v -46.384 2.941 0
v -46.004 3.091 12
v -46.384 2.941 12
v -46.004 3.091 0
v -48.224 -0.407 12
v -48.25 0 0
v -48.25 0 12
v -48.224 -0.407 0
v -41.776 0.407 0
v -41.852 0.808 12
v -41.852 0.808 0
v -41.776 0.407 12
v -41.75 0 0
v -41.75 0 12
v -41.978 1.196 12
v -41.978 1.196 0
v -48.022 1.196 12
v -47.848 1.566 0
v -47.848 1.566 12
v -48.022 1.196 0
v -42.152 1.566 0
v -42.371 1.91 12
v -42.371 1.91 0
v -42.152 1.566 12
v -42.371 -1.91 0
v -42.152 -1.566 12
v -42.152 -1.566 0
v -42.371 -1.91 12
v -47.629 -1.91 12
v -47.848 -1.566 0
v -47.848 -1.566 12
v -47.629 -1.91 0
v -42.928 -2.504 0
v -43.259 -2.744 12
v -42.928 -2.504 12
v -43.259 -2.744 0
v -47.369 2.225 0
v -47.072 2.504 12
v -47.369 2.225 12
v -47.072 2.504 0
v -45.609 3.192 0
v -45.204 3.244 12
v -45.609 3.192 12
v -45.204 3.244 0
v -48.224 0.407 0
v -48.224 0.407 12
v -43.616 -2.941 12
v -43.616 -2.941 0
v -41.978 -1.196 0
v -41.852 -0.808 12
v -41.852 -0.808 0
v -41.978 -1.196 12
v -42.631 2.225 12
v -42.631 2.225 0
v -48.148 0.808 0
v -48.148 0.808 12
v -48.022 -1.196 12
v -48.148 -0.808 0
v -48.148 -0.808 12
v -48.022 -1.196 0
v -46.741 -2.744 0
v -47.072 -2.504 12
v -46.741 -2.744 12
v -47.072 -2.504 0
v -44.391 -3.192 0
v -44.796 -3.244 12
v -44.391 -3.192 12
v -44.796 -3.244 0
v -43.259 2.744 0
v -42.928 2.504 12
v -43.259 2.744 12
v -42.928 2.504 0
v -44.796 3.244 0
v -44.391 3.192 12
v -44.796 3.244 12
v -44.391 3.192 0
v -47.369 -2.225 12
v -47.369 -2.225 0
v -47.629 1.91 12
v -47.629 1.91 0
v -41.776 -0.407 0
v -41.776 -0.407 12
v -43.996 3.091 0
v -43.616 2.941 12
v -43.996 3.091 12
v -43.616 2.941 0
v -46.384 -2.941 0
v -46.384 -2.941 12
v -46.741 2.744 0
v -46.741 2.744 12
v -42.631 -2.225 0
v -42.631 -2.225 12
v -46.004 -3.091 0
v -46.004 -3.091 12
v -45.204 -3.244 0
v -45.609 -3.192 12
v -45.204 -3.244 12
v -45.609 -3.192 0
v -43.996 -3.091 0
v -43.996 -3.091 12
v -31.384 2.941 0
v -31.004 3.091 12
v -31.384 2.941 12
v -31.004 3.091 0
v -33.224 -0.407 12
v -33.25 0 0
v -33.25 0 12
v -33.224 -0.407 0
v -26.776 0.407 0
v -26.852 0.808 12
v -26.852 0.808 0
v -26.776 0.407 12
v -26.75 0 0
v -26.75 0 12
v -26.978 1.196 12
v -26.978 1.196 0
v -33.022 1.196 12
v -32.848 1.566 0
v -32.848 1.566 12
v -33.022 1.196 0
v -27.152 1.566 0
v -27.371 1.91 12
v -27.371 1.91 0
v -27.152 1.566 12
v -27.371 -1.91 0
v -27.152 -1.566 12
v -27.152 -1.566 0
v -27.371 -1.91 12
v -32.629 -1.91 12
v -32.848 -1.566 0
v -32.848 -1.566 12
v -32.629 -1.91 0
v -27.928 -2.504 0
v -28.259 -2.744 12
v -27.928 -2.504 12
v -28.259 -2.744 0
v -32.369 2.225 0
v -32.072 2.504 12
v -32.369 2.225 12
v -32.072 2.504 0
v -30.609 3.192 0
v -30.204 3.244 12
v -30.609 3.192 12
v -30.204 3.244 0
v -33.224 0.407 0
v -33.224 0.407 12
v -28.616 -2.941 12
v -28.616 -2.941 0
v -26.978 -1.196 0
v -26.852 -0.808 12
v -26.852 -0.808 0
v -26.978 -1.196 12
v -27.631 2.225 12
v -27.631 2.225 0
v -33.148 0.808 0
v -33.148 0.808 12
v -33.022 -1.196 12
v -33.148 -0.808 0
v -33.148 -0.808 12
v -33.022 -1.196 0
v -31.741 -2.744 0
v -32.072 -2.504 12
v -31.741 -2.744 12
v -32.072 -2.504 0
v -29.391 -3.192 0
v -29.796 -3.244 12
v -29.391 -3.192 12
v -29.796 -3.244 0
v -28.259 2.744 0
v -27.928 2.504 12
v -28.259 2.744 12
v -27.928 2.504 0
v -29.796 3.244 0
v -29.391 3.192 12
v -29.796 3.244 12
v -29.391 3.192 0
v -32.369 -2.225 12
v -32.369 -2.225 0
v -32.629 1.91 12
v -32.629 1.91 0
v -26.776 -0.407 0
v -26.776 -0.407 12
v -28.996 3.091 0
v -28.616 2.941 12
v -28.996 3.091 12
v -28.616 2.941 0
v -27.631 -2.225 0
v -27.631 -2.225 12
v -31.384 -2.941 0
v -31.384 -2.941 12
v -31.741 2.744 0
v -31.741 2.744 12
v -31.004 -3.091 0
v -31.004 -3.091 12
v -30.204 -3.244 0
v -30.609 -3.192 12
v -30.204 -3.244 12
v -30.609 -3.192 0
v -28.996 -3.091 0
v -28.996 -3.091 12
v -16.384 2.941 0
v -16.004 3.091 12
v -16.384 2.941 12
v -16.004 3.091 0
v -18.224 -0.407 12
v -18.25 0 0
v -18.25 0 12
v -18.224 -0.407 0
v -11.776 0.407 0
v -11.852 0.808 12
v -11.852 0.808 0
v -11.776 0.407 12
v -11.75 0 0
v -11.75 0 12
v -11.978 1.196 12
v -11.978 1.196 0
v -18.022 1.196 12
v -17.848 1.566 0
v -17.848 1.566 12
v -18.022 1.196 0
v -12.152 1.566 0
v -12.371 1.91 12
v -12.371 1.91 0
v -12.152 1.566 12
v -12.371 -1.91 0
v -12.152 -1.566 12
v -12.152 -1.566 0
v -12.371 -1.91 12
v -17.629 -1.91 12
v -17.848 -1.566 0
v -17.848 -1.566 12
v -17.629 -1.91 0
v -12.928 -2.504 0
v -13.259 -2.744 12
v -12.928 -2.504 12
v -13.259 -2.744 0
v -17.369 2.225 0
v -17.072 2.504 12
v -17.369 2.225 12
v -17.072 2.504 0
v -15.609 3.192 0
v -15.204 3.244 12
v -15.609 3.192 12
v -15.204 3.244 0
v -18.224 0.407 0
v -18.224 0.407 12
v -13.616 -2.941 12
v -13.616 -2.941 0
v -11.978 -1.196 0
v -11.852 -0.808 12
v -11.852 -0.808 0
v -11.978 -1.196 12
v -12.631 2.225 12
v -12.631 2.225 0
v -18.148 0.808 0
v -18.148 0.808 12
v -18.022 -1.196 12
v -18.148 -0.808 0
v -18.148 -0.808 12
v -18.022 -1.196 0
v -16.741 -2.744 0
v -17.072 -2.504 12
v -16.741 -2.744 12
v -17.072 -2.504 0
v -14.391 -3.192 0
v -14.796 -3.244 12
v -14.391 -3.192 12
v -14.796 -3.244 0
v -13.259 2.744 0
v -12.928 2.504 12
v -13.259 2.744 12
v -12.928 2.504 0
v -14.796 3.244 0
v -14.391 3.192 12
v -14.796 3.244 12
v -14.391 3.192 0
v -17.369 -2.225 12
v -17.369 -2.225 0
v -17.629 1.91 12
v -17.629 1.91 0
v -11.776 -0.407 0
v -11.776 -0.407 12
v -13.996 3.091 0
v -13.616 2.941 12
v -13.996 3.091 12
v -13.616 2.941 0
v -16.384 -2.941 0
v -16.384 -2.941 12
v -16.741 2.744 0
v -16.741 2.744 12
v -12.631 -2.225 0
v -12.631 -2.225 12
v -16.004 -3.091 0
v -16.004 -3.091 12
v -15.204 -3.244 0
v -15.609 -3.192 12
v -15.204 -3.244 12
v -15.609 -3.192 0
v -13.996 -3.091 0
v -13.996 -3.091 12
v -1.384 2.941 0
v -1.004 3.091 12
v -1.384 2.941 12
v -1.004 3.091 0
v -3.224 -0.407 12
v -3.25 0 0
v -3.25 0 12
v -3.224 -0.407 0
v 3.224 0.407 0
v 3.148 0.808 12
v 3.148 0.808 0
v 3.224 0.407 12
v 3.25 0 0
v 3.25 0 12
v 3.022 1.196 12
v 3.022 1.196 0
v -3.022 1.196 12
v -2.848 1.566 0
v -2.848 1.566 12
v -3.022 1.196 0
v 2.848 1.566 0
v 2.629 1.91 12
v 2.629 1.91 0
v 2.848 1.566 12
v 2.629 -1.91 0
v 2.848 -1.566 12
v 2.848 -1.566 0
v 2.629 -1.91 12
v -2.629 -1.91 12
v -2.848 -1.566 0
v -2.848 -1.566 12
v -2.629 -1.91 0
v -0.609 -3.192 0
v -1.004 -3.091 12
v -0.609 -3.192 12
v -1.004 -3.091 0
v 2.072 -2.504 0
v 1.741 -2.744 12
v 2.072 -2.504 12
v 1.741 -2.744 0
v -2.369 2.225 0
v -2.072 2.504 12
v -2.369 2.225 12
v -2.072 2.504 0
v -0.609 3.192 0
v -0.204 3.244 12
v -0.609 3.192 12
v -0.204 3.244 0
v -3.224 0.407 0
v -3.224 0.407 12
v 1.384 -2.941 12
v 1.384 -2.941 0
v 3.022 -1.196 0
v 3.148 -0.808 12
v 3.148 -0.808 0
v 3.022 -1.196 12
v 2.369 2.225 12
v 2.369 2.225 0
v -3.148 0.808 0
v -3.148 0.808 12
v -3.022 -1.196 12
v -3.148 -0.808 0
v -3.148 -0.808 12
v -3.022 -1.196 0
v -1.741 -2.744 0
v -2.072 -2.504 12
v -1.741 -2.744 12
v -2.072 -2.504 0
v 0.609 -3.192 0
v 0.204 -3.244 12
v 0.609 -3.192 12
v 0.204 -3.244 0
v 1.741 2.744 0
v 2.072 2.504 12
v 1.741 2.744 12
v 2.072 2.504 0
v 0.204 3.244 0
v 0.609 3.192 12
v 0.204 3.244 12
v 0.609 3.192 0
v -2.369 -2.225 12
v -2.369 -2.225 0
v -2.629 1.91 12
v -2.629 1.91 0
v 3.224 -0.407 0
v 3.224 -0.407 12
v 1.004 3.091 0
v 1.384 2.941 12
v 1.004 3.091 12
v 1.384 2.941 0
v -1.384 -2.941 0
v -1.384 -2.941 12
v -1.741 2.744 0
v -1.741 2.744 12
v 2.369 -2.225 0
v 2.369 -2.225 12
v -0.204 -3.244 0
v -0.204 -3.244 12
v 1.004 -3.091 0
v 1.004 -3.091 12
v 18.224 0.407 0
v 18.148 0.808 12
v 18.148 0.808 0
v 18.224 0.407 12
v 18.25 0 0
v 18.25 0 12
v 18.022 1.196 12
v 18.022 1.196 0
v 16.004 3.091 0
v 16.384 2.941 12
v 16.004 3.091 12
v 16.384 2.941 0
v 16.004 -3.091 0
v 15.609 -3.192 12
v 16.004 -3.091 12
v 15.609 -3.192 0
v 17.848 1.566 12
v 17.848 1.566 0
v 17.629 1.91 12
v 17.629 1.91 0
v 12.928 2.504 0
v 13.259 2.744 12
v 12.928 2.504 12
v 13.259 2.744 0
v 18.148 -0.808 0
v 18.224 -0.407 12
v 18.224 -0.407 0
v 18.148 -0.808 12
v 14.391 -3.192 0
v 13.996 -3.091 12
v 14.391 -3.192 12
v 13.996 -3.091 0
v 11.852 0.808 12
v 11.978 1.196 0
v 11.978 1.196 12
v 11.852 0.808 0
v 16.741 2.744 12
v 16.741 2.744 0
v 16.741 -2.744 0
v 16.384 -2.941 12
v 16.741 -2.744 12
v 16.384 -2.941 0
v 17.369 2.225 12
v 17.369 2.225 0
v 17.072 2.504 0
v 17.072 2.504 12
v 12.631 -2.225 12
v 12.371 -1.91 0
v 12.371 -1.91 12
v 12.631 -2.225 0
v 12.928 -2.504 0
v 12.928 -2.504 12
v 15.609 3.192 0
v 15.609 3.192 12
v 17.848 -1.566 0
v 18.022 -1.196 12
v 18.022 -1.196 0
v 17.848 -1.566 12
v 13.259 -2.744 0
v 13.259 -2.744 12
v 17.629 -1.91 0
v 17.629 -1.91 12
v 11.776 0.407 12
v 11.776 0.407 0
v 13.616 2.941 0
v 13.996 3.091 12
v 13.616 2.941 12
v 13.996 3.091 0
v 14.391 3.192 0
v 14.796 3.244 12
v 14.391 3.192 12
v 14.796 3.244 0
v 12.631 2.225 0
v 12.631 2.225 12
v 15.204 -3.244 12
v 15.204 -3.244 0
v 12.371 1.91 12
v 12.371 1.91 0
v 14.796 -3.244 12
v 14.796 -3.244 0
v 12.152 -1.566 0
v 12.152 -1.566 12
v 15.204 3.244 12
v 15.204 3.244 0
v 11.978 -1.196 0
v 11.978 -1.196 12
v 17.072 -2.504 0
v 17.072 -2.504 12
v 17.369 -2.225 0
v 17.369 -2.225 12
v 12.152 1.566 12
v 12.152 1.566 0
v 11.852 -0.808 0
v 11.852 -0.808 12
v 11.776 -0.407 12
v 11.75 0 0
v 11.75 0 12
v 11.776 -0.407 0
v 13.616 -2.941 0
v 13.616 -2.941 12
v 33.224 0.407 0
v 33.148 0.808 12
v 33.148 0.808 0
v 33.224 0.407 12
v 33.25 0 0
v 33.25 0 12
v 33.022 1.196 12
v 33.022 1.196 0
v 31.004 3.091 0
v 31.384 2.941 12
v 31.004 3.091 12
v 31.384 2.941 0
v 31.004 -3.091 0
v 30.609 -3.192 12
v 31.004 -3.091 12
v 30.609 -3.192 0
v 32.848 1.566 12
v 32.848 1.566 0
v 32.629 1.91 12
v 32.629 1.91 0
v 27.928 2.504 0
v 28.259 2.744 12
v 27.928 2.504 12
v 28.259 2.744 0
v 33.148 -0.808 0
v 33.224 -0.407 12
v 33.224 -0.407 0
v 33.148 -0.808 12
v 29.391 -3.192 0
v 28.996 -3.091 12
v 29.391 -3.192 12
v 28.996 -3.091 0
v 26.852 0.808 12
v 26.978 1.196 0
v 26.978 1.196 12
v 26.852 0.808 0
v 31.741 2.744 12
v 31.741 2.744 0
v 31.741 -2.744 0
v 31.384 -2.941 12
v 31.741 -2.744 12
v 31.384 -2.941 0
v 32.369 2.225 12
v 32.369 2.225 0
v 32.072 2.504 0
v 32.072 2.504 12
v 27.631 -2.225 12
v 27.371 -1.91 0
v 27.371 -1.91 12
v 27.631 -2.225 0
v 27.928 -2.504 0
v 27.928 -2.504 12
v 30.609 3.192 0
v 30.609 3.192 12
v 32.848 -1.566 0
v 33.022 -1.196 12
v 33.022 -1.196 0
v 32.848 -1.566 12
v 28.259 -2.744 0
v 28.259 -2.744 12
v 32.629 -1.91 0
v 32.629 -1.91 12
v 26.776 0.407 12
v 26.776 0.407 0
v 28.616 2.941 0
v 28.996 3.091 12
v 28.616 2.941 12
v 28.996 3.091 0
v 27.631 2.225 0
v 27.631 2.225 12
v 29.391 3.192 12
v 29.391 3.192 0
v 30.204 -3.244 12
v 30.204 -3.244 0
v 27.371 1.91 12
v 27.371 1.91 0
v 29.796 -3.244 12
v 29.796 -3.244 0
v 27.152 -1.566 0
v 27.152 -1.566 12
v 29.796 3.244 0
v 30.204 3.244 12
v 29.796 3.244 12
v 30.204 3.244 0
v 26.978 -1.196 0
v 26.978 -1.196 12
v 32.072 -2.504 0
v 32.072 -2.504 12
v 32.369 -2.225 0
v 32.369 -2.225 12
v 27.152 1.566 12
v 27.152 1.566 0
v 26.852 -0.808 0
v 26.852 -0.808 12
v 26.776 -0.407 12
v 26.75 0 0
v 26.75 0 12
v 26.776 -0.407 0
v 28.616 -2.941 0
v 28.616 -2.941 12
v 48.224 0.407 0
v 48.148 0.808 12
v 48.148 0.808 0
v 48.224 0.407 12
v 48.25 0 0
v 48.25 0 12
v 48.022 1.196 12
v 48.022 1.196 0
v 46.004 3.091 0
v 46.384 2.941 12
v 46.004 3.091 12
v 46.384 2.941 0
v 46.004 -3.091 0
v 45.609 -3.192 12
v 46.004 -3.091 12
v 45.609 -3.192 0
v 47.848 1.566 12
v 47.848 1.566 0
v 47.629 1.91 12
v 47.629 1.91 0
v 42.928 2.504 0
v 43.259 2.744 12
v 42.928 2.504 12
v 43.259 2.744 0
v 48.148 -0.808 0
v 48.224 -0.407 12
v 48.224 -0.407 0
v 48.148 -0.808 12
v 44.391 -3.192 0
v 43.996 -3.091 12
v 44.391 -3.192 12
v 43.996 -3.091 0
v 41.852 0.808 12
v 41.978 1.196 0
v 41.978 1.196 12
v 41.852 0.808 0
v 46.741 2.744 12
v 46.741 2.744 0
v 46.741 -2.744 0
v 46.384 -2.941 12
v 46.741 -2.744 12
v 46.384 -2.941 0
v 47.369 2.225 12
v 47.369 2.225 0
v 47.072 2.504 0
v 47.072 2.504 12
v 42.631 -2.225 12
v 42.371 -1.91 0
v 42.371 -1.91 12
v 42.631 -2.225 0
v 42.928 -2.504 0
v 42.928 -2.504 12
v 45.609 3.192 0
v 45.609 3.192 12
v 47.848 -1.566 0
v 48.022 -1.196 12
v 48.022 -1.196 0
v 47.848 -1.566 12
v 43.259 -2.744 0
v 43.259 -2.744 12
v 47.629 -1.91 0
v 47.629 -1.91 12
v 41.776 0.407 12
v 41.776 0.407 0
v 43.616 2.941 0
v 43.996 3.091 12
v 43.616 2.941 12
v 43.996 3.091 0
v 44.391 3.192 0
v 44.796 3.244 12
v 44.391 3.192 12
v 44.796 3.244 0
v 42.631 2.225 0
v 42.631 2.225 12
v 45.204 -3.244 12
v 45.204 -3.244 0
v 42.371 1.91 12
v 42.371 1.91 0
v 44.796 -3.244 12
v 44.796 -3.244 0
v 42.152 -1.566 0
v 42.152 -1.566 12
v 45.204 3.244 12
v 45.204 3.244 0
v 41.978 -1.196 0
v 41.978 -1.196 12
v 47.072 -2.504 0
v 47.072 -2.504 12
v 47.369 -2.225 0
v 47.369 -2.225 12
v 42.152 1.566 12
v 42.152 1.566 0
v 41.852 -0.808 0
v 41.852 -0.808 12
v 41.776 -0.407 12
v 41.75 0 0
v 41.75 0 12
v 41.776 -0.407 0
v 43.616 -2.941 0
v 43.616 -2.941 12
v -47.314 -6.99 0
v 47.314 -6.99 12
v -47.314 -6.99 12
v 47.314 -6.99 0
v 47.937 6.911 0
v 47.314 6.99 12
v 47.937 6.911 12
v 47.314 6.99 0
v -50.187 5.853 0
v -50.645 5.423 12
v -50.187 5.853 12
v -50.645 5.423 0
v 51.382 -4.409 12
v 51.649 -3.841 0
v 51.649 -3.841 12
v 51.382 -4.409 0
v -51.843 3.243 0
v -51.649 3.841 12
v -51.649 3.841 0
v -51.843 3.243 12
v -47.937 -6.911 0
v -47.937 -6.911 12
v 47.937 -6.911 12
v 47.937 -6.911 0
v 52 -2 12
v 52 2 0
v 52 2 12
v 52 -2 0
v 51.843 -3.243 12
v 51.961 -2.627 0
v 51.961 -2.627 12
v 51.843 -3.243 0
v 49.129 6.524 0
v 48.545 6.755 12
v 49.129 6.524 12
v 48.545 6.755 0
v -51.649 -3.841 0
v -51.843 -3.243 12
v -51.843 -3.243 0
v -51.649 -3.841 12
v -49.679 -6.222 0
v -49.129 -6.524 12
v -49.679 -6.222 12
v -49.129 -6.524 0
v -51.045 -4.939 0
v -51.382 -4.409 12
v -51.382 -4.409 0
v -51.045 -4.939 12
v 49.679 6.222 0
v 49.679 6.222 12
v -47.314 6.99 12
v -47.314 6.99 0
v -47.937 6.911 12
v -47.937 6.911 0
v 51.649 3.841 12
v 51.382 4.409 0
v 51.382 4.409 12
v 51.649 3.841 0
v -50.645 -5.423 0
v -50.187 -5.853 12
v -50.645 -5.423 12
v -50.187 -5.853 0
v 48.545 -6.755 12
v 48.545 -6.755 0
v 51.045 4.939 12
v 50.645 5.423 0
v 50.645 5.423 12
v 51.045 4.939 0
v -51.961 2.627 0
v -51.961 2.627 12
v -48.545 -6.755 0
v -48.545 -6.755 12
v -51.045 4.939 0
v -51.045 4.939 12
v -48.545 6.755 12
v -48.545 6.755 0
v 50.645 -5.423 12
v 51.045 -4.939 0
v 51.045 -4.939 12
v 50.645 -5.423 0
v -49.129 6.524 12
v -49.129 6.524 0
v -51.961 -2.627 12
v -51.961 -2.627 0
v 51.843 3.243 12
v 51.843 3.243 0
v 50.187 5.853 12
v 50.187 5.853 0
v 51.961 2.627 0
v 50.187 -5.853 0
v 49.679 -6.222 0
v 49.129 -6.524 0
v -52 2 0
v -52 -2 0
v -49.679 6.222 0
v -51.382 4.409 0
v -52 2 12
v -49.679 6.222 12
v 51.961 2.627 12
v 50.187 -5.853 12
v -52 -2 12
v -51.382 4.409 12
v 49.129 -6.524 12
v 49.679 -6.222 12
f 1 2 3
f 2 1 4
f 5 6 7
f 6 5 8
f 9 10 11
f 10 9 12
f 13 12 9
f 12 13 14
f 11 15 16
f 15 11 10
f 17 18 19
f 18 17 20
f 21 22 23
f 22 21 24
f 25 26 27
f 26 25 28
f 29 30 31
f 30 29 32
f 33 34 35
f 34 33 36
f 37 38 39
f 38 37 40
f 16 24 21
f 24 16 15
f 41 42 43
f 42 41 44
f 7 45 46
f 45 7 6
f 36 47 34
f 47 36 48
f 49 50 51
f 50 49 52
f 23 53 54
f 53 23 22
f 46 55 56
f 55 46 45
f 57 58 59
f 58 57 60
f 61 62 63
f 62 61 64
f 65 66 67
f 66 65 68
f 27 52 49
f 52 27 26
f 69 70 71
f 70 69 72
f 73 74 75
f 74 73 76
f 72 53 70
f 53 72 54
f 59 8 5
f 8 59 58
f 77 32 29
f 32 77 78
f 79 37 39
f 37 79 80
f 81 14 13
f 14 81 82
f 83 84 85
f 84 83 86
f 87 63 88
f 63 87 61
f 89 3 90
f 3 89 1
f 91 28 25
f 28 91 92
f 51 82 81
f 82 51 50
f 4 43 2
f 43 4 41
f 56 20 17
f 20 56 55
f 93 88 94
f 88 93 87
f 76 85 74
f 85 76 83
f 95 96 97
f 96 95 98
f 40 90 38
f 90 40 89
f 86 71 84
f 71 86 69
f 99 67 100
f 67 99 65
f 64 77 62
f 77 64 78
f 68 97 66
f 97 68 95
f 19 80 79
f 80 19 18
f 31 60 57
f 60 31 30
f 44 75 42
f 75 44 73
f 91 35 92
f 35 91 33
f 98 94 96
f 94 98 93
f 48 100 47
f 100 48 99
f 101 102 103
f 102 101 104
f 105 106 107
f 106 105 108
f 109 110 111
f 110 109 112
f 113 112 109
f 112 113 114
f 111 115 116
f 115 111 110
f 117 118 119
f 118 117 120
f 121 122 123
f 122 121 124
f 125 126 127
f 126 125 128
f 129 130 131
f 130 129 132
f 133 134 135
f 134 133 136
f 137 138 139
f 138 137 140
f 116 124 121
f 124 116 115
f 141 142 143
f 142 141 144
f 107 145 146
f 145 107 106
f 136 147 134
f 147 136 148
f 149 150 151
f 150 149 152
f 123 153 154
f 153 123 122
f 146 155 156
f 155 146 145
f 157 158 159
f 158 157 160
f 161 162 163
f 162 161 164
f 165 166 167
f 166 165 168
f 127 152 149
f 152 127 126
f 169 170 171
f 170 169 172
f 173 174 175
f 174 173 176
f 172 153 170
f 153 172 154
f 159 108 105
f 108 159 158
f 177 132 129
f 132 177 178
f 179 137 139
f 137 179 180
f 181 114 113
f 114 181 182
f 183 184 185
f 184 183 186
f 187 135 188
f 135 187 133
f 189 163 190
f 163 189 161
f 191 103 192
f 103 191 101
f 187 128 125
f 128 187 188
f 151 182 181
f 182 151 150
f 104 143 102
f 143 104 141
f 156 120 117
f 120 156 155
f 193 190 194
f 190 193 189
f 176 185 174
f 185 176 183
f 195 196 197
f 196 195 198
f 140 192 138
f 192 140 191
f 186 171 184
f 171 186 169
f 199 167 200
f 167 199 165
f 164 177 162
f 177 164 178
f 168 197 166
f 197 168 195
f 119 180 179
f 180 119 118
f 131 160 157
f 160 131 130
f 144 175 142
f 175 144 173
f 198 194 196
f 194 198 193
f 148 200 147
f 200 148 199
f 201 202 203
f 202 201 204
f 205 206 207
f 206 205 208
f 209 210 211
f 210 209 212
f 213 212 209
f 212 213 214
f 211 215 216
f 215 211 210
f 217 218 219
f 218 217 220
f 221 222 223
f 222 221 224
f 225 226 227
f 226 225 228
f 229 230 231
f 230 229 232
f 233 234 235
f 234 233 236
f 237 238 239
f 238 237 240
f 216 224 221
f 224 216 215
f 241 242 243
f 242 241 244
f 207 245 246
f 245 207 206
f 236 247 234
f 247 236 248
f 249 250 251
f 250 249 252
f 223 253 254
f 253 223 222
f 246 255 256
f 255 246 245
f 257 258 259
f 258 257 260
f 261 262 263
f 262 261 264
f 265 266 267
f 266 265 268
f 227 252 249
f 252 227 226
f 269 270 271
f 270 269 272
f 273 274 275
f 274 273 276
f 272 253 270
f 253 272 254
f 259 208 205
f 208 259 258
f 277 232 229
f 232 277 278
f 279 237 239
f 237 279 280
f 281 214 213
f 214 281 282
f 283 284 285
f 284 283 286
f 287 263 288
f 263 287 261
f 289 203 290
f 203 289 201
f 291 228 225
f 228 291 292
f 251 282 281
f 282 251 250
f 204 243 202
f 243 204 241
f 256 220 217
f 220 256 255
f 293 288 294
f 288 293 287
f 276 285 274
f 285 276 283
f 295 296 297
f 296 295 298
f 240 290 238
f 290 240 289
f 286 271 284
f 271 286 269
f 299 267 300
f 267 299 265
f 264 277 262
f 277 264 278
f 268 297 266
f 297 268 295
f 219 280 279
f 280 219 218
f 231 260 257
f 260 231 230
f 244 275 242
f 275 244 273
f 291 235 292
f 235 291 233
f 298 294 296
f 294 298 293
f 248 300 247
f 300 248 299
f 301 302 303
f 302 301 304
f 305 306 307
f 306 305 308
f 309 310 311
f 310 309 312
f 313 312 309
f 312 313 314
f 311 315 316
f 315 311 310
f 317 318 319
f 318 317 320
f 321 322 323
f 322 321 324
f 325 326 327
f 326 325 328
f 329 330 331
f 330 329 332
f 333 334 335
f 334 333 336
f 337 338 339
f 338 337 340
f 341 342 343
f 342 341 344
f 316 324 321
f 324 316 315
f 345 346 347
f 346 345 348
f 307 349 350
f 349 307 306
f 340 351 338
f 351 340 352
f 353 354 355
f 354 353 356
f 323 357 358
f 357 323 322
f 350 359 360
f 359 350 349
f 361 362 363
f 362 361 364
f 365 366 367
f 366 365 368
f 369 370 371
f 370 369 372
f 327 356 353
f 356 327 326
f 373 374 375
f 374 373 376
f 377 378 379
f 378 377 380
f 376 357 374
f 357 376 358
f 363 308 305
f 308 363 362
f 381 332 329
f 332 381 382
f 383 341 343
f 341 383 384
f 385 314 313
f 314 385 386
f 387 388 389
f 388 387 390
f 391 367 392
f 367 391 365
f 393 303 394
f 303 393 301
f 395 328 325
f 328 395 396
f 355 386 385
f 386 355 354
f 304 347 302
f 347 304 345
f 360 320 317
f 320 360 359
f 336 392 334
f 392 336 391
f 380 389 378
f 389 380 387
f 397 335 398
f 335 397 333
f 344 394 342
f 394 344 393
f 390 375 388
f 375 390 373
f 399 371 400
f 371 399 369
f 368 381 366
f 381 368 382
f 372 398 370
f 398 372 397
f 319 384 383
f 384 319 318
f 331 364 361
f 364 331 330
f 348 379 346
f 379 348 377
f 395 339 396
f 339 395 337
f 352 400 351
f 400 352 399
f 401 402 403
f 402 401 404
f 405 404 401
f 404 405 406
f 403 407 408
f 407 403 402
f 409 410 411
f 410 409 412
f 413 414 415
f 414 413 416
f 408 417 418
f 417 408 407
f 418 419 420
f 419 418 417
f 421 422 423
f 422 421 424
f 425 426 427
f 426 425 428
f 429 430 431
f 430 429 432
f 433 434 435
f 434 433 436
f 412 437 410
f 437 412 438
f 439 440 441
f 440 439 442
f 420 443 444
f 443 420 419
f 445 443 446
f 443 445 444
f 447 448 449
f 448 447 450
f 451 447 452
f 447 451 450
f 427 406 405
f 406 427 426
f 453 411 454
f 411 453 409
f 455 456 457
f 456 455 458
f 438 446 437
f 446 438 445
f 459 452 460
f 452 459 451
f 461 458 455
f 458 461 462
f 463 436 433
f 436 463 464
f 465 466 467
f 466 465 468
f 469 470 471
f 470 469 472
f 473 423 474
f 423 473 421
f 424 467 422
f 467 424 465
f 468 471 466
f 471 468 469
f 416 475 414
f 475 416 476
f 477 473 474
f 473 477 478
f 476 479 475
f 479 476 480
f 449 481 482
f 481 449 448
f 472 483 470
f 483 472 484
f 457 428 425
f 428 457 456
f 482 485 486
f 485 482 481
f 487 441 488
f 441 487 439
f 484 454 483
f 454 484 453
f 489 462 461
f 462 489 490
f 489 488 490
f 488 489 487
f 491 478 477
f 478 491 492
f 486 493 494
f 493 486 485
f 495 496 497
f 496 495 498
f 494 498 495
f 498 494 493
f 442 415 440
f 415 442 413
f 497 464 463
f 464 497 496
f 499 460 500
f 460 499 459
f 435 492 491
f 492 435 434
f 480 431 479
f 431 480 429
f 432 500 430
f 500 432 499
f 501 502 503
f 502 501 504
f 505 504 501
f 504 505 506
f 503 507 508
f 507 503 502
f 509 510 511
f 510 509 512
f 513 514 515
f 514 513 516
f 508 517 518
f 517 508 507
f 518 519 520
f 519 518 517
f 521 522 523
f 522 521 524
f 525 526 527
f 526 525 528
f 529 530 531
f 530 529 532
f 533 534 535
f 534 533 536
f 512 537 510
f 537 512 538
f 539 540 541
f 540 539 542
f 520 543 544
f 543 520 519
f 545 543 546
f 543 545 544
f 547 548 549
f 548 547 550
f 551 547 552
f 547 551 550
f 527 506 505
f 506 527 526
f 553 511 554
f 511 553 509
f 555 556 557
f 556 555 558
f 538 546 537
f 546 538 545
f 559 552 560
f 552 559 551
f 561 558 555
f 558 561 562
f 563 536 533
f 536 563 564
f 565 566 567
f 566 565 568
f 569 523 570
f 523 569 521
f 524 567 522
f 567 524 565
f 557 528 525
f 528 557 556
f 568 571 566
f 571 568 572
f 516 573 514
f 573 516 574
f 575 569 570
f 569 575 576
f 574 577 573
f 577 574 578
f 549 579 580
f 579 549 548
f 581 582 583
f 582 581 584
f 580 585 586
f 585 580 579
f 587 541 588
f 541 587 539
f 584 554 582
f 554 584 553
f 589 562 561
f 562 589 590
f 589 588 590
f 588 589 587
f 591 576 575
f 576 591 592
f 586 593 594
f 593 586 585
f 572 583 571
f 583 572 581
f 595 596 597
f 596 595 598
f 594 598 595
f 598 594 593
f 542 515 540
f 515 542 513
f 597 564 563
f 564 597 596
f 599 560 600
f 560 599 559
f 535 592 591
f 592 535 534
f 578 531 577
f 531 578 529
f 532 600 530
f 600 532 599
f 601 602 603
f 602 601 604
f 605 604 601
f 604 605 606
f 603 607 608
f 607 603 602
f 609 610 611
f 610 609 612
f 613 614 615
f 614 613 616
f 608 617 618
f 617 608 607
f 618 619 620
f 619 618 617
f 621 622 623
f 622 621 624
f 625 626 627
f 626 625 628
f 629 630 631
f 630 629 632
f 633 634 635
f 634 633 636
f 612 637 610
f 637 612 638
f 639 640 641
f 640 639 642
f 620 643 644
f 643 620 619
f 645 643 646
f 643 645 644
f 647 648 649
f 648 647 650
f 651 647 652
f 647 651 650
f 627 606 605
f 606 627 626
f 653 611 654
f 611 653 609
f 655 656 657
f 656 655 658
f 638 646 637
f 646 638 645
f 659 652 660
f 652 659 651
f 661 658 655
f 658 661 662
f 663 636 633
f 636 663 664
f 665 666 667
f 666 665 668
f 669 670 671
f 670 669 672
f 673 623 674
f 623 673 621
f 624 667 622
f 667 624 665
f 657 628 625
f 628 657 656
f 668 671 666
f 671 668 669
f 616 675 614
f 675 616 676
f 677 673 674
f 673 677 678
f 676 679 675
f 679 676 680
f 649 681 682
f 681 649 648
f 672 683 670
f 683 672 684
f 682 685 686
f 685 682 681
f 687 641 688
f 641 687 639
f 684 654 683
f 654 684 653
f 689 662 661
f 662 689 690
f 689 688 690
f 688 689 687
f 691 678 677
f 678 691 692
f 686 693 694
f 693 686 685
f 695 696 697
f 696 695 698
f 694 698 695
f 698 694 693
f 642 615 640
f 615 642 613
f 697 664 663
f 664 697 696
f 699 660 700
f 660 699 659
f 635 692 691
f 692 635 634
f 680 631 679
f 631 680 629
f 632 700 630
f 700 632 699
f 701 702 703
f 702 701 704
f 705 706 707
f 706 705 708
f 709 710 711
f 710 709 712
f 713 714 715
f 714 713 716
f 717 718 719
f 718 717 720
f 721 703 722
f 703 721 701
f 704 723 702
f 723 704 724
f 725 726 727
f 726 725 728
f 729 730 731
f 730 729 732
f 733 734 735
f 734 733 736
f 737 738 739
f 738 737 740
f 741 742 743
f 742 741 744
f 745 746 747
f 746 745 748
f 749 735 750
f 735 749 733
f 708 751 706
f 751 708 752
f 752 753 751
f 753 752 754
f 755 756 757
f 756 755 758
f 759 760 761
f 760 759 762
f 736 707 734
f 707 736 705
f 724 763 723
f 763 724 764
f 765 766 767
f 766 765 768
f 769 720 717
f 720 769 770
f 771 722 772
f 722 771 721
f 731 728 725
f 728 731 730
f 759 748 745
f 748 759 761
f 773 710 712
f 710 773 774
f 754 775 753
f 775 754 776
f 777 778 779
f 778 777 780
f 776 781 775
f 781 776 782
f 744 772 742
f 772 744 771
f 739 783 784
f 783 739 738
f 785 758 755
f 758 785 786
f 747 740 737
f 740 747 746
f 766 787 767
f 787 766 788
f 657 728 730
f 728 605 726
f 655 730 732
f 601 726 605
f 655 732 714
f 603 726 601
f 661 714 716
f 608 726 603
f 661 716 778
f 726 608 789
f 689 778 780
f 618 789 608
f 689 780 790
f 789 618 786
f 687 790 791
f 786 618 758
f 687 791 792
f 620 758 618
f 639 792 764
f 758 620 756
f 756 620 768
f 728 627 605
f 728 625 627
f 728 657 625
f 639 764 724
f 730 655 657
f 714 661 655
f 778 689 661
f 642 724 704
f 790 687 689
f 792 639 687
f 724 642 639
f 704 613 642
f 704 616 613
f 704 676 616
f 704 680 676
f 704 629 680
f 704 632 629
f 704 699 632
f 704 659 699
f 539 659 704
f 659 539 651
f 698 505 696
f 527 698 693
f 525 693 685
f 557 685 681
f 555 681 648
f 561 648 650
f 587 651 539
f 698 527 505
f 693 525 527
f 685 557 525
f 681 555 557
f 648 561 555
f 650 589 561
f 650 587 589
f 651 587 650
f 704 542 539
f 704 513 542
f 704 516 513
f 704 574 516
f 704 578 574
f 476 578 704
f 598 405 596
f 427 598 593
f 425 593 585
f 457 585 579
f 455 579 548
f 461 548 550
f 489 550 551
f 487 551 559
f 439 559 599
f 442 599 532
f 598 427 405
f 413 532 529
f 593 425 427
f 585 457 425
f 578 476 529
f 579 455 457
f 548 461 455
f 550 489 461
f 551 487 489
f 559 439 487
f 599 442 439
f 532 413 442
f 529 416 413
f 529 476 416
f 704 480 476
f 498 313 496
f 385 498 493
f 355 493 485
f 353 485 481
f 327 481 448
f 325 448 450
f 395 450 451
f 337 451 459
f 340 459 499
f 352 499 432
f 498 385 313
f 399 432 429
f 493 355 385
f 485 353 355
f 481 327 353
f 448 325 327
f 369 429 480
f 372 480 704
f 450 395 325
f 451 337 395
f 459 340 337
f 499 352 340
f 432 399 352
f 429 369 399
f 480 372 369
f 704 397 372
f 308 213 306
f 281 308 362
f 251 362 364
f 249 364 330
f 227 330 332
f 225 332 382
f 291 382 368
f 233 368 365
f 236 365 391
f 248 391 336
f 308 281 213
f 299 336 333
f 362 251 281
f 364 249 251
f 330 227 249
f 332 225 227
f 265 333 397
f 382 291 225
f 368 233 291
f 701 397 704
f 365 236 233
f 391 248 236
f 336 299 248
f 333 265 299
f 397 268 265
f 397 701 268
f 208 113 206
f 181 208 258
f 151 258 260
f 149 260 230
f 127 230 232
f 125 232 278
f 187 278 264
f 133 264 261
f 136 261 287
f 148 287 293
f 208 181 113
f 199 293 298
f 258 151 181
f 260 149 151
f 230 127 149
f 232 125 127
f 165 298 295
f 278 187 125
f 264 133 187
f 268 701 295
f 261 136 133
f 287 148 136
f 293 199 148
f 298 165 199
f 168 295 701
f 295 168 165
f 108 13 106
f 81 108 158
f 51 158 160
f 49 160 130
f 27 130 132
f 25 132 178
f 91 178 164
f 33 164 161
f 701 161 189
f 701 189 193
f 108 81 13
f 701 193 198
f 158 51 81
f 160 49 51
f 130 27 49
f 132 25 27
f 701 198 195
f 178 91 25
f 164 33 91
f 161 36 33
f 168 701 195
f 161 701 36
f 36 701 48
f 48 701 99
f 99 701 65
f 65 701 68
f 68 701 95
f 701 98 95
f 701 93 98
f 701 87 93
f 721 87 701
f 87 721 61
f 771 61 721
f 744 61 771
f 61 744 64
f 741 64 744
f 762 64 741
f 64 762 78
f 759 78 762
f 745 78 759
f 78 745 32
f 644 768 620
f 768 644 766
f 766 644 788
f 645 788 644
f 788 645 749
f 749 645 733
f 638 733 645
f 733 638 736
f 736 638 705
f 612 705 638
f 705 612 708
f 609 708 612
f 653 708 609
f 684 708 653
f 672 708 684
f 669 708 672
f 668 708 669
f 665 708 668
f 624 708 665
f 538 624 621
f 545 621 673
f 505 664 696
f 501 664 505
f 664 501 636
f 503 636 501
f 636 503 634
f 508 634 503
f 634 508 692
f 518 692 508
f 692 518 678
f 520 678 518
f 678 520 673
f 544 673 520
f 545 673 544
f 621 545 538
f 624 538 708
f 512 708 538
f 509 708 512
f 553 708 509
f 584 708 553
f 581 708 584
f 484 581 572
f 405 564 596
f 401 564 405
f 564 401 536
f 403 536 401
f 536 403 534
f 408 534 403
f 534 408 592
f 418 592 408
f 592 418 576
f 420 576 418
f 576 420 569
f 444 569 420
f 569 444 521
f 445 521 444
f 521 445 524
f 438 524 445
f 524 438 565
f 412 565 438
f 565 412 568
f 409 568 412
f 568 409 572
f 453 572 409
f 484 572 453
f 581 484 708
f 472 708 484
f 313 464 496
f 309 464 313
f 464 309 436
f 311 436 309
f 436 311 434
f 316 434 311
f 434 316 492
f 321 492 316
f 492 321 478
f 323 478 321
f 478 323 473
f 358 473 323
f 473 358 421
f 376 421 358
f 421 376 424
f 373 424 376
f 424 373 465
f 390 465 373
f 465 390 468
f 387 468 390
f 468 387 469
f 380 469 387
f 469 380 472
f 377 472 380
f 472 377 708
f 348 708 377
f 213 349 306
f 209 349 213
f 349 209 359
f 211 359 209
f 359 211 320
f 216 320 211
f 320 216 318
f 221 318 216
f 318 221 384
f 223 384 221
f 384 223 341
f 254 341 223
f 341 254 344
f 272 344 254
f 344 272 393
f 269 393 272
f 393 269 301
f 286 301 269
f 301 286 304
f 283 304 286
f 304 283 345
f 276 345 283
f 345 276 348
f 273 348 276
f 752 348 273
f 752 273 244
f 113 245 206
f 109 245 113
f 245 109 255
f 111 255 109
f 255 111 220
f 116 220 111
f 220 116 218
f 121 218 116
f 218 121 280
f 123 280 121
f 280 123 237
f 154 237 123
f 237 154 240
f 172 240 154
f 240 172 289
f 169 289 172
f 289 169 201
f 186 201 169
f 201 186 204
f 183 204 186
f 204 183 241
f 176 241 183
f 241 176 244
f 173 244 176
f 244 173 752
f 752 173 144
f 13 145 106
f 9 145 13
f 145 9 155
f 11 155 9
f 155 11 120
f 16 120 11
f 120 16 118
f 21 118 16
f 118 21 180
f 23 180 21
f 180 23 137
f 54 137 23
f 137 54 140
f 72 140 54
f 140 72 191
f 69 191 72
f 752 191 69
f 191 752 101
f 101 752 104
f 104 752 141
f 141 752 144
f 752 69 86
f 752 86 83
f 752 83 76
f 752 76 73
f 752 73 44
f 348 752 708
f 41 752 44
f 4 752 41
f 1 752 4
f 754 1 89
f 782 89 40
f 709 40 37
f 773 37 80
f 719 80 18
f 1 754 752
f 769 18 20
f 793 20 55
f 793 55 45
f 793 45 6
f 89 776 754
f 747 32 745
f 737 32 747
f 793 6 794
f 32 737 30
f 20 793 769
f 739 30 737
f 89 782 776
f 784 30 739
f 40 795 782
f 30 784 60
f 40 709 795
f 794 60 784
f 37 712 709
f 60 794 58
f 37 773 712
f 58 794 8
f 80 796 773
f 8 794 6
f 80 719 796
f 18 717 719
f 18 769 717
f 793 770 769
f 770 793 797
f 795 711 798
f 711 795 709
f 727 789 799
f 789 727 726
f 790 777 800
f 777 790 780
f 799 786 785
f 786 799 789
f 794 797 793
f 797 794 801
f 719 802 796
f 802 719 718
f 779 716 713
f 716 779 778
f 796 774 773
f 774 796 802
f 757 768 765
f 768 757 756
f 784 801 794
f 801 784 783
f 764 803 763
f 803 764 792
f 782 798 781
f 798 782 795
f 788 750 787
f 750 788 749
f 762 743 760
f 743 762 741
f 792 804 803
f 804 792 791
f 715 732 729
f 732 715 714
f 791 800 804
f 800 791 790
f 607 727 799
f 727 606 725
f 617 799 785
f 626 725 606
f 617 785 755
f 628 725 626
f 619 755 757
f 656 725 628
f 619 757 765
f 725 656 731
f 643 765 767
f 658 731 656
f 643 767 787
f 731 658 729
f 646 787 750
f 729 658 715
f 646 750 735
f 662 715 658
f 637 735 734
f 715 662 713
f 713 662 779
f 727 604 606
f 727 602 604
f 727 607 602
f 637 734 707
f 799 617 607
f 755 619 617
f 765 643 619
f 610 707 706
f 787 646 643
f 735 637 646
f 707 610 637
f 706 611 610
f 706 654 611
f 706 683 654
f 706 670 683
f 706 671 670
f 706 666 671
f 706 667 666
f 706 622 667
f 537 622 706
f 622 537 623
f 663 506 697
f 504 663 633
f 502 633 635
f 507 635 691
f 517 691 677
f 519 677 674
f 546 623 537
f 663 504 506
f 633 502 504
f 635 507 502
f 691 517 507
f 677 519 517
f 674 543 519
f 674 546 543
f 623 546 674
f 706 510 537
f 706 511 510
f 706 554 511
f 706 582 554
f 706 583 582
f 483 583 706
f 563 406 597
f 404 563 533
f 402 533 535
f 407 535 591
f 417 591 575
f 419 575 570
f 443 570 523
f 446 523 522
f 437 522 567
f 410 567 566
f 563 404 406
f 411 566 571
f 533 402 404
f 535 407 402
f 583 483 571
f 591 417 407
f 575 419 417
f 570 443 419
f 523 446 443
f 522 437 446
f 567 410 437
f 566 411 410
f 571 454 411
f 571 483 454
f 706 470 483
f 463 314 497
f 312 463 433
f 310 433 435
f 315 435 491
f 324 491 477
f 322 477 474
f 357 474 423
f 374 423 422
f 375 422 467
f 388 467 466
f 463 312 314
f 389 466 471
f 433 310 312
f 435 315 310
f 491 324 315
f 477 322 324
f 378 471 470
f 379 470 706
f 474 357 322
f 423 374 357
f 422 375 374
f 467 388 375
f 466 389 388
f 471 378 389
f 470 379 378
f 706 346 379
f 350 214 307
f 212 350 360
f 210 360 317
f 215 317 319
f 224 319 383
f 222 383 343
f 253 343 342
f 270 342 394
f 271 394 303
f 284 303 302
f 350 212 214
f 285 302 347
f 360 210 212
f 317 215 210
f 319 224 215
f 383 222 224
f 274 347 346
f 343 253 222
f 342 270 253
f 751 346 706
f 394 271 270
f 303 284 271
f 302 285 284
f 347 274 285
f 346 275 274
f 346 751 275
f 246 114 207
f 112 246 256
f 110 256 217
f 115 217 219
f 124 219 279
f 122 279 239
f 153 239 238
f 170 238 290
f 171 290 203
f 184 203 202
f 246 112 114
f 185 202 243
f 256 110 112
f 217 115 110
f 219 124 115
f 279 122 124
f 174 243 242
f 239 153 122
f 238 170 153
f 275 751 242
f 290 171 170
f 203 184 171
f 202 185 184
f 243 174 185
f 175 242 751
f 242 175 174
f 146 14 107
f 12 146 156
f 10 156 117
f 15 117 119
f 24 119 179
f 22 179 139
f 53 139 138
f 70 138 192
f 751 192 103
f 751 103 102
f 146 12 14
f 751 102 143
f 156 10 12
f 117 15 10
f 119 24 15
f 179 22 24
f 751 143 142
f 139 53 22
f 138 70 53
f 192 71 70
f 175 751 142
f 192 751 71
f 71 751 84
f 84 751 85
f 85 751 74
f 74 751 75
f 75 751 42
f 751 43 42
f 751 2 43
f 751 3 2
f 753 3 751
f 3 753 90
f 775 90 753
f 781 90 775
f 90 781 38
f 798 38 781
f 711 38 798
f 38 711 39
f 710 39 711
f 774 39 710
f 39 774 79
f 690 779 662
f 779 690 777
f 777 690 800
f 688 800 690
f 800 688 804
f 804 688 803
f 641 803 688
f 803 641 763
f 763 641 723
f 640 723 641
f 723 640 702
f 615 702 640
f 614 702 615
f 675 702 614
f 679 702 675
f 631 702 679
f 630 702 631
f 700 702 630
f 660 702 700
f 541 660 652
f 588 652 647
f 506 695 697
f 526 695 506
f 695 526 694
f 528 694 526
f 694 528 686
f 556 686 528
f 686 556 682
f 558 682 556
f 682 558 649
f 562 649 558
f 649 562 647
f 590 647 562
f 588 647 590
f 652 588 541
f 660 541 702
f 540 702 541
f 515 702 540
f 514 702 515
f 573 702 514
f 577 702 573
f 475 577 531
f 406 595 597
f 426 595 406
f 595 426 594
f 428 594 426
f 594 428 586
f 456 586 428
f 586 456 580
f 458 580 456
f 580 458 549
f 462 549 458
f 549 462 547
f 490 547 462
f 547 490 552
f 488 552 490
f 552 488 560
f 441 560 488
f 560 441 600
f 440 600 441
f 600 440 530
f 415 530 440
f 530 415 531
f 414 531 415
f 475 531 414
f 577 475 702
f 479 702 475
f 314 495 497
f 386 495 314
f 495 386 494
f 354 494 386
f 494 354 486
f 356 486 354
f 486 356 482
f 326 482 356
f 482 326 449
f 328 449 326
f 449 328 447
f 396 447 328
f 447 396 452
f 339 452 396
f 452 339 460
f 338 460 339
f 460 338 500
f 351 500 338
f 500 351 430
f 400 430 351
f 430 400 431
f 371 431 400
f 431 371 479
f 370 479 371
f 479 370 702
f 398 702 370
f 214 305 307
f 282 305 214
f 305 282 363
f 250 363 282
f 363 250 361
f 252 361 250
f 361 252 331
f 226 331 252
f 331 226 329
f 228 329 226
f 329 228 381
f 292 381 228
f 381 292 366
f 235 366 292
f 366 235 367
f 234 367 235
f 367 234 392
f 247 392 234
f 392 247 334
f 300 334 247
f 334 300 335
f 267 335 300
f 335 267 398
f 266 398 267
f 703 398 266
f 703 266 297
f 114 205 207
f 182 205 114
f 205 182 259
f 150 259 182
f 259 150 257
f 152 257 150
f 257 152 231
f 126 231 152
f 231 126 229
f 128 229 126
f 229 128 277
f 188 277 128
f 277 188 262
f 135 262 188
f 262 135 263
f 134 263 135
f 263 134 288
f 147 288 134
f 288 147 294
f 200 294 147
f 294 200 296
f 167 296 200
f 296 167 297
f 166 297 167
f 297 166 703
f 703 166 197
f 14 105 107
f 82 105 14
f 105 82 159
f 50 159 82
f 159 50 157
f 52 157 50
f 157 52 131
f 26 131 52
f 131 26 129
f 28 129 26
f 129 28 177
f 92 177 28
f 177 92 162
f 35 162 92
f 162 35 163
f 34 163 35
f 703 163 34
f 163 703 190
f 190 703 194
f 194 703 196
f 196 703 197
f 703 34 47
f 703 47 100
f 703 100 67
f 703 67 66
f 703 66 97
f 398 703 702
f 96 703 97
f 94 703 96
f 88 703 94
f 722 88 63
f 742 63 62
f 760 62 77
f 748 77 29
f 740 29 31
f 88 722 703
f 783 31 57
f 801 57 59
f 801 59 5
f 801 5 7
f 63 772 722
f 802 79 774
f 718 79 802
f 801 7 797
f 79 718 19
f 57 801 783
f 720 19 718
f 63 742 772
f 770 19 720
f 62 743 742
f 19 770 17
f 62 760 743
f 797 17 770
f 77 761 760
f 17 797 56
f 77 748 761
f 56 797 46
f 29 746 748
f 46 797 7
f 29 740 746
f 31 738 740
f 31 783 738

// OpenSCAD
$fn = 50;


difference() {
	union() {
		hull() {
			translate(v = [-47.0000000000, 2.0000000000, 0]) {
				cylinder(h = 12, r = 5);
			}
			translate(v = [47.0000000000, 2.0000000000, 0]) {
				cylinder(h = 12, r = 5);
			}
			translate(v = [-47.0000000000, -2.0000000000, 0]) {
				cylinder(h = 12, r = 5);
			}
			translate(v = [47.0000000000, -2.0000000000, 0]) {
				cylinder(h = 12, r = 5);
			}
		}
	}
	union() {
		translate(v = [-45.0000000000, 0.0000000000, -100.0000000000]) {
			cylinder(h = 200, r = 3.2500000000);
		}
		translate(v = [-30.0000000000, 0.0000000000, -100.0000000000]) {
			cylinder(h = 200, r = 3.2500000000);
		}
		translate(v = [-15.0000000000, 0.0000000000, -100.0000000000]) {
			cylinder(h = 200, r = 3.2500000000);
		}
		translate(v = [0.0000000000, 0.0000000000, -100.0000000000]) {
			cylinder(h = 200, r = 3.2500000000);
		}
		translate(v = [15.0000000000, 0.0000000000, -100.0000000000]) {
			cylinder(h = 200, r = 3.2500000000);
		}
		translate(v = [30.0000000000, 0.0000000000, -100.0000000000]) {
			cylinder(h = 200, r = 3.2500000000);
		}
		translate(v = [45.0000000000, 0.0000000000, -100.0000000000]) {
			cylinder(h = 200, r = 3.2500000000);
		}
	}
}
